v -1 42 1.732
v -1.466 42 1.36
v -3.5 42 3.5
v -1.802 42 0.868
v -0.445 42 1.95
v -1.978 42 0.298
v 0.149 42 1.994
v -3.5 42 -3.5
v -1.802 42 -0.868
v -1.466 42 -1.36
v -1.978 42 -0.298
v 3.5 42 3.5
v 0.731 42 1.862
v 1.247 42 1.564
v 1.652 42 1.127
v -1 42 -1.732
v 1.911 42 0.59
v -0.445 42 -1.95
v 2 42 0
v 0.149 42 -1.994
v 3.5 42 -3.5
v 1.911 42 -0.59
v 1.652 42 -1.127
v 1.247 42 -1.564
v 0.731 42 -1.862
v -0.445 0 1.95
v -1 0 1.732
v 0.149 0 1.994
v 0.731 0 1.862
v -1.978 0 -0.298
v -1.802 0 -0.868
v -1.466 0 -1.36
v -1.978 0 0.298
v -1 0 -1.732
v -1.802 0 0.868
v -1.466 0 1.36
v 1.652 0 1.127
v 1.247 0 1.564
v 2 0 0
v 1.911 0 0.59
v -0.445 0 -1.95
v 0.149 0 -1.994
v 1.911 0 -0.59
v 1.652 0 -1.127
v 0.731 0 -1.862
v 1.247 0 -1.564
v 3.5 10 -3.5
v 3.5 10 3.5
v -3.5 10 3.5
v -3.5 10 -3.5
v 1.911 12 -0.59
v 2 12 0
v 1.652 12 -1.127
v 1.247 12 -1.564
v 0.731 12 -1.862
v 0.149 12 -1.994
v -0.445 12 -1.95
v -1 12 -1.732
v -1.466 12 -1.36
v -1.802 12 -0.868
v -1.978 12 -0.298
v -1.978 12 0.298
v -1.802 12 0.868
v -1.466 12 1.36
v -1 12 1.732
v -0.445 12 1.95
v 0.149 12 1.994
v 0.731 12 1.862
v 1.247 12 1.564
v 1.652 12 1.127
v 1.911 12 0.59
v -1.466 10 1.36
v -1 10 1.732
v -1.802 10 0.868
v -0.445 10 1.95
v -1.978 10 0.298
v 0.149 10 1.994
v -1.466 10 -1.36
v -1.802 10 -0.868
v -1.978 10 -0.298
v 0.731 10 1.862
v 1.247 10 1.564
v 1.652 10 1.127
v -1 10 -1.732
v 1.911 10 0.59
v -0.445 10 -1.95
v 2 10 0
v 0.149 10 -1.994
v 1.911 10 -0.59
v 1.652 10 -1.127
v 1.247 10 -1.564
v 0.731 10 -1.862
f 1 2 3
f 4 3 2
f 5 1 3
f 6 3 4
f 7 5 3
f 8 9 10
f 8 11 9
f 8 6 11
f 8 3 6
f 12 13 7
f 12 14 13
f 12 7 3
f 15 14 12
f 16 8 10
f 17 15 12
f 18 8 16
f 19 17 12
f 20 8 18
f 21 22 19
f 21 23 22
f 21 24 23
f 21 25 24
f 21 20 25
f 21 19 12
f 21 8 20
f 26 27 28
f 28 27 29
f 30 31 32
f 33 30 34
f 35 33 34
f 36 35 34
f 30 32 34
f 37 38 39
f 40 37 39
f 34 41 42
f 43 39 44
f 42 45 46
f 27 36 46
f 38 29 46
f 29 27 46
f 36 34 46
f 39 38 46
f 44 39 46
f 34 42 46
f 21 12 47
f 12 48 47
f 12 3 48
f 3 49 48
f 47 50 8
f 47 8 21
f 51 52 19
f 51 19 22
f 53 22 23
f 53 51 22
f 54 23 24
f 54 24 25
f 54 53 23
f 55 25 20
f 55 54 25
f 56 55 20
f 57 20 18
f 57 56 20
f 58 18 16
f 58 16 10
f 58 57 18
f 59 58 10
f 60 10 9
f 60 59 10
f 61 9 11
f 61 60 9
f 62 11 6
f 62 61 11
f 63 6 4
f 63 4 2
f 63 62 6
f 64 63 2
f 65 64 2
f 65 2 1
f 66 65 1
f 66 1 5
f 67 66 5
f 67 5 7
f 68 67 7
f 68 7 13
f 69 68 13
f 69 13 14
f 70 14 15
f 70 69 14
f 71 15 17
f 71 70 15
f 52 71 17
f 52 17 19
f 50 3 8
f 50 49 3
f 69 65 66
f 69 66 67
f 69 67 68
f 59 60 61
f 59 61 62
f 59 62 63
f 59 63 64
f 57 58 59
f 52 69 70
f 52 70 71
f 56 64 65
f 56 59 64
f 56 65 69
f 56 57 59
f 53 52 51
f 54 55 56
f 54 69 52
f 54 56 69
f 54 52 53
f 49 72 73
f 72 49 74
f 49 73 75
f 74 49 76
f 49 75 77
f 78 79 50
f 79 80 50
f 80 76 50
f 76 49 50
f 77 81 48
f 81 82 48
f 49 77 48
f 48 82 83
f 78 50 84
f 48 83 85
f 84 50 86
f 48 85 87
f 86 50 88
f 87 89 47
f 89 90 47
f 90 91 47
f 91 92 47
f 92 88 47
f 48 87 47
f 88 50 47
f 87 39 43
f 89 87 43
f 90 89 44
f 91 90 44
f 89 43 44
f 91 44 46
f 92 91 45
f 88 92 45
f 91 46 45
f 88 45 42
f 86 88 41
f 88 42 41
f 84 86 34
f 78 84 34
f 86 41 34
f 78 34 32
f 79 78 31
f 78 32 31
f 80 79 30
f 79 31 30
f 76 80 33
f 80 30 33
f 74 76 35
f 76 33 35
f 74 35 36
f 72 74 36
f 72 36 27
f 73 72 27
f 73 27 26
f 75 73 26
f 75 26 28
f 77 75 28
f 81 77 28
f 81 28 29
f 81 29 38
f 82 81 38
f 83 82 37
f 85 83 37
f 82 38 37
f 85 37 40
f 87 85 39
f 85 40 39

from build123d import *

# Parameters (mm, degrees)
SKETCH1_R           = 2
BOSS_EXTRUDE1_DEPTH = 10
BOSS_EXTRUDE2_START = 10
SKETCH1_3_W         = 7
SKETCH1_3_H         = 7
BOSS_EXTRUDE2_DEPTH = 2
BOSS_EXTRUDE3_START = 12
SKETCH1_4_W         = 7
SKETCH1_4_H         = 7
SKETCH1_4_R         = 2
BOSS_EXTRUDE3_DEPTH = 30


with BuildPart() as part:
    # Sketch1 → Boss-Extrude1 (new body)
    with BuildSketch(Plane(origin=(0, 0, 0), x_dir=(1, 0, 0), z_dir=(0, 1, 0))):
        Circle(SKETCH1_R)
    extrude(amount=BOSS_EXTRUDE1_DEPTH)

    # Sketch1<3> → Boss-Extrude2 (add)
    with BuildSketch(Plane(origin=(0, 0, 0), x_dir=(1, 0, 0), z_dir=(0, 1, 0)).offset(BOSS_EXTRUDE2_START)):
        Rectangle(SKETCH1_3_W, SKETCH1_3_H)
    extrude(amount=BOSS_EXTRUDE2_DEPTH)

    # Sketch1<4> → Boss-Extrude3 (add)
    with BuildSketch(Plane(origin=(0, 0, 0), x_dir=(1, 0, 0), z_dir=(0, 1, 0)).offset(BOSS_EXTRUDE3_START)):
        Rectangle(SKETCH1_4_W, SKETCH1_4_H)
        Circle(SKETCH1_4_R, mode=Mode.SUBTRACT)
    extrude(amount=BOSS_EXTRUDE3_DEPTH)


solid = part.part
